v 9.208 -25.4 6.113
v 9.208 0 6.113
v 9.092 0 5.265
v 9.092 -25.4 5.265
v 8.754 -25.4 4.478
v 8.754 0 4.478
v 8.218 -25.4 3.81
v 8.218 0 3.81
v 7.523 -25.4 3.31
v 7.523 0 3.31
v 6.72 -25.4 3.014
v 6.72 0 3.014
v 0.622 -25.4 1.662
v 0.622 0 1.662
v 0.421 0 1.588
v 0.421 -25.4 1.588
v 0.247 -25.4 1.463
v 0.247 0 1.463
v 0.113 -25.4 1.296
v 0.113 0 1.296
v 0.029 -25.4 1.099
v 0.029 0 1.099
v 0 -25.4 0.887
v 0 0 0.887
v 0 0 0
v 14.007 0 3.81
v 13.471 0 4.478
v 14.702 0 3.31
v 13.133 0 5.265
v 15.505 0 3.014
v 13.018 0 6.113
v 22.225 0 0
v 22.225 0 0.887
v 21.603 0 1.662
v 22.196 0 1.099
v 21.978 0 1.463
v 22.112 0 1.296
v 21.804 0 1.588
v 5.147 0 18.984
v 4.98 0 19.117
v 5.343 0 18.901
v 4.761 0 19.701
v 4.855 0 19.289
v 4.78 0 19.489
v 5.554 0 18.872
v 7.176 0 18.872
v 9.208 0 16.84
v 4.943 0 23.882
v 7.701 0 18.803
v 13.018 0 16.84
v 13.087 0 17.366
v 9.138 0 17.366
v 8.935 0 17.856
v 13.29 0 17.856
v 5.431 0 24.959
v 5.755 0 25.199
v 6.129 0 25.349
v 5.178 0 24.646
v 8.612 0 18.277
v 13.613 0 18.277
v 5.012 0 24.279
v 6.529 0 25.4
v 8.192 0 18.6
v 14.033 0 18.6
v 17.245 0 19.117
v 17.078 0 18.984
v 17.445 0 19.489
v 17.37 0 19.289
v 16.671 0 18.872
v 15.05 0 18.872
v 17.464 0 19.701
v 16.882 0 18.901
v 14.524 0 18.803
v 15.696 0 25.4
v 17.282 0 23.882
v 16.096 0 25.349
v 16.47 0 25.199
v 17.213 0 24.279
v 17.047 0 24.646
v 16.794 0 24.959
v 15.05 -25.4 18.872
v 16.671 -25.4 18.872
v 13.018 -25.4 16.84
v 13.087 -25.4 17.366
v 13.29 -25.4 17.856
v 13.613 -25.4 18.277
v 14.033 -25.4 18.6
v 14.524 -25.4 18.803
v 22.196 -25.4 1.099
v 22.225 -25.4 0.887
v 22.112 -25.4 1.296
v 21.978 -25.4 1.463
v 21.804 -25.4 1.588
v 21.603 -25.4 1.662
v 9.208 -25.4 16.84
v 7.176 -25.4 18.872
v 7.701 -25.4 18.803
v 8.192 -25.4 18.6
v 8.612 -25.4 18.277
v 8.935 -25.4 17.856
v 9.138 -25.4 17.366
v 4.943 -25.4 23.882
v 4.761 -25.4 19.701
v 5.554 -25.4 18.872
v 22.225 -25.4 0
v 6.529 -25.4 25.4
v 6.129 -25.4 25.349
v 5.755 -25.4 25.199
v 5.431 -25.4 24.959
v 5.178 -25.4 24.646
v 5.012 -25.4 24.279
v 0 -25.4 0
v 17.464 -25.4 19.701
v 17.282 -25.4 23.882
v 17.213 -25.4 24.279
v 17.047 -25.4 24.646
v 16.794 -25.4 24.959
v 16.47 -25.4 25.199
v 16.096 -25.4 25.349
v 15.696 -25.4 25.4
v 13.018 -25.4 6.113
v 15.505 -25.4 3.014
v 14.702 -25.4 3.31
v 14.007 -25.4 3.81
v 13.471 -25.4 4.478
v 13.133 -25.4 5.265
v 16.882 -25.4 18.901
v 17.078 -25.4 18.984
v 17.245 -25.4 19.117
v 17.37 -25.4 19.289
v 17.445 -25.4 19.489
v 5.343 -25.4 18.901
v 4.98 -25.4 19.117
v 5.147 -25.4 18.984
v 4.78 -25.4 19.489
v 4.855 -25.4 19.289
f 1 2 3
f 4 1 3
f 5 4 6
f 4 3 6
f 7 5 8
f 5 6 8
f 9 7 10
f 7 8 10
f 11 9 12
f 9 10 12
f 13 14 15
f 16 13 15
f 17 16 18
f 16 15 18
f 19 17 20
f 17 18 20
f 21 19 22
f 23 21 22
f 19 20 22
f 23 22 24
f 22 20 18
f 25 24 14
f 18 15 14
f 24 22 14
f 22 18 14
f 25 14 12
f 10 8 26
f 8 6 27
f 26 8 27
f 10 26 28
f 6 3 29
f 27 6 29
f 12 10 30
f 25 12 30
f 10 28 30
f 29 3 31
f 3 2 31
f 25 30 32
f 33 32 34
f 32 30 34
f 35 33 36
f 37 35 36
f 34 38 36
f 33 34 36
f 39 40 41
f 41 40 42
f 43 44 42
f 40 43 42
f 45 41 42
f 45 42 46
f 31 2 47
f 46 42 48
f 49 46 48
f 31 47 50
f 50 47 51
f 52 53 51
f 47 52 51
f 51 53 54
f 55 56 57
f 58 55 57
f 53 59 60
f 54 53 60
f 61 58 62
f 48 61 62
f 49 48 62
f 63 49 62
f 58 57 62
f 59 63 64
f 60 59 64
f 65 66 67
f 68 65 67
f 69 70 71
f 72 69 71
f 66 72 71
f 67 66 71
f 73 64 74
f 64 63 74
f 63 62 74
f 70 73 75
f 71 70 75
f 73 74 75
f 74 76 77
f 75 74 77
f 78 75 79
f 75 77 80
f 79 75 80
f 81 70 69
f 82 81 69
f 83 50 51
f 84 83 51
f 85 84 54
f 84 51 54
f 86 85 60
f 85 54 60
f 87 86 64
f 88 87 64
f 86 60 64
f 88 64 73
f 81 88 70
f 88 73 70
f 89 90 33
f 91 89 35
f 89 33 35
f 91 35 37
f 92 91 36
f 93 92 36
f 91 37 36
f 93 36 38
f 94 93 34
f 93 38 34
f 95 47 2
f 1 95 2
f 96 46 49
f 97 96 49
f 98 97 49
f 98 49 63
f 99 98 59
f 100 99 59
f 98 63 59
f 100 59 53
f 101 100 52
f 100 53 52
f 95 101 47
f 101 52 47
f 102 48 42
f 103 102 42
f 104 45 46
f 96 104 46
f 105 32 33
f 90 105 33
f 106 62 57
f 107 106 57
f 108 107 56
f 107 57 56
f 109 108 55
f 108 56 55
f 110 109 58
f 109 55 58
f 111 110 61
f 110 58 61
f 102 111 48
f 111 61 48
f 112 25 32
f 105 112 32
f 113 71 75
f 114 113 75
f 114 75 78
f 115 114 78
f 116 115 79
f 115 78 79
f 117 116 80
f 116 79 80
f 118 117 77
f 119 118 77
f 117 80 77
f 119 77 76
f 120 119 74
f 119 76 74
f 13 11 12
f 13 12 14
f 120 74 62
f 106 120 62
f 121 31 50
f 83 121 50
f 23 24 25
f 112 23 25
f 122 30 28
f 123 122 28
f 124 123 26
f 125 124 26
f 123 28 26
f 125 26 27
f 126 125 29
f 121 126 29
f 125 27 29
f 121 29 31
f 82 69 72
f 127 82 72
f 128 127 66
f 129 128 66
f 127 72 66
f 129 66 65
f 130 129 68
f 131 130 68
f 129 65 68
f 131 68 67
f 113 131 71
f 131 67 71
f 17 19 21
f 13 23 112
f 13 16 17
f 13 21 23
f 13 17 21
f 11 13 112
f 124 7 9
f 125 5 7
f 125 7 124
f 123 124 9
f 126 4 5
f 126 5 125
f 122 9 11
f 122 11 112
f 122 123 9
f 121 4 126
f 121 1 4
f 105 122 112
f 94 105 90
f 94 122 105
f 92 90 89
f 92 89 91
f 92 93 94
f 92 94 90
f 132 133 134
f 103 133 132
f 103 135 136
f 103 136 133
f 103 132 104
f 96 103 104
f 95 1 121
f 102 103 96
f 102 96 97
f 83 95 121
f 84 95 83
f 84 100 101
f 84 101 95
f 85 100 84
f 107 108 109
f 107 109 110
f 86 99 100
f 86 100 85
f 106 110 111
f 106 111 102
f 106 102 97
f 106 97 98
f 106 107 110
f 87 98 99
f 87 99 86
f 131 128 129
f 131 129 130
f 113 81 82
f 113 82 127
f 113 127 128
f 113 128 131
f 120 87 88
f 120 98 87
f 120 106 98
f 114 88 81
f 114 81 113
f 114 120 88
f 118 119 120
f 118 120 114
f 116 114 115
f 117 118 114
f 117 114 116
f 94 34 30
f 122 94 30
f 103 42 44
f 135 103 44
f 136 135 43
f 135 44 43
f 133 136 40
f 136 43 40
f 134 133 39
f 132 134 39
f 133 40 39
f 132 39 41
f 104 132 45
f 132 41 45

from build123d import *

# Parameters (mm, degrees)
F1_DEPTH = 25.4


with BuildPart() as f1:
    # F0 (on Front) → F1 (new body)
    with BuildSketch(Plane.XZ):
        with BuildLine():
            Line((0, 0.886948), (0, 0))
            Line((0, 0), (22.225, 0))
            Line((22.225, 0), (22.225, 0.886948))
            ThreePointArc((22.225, 0.886948), (22.050283, 1.383775), (21.603049, 1.661883))
            Line((21.603049, 1.661883), (15.505304, 3.013721))
            ThreePointArc((15.505304, 3.013721), (13.716367, 4.126153), (13.0175, 6.113461))
            Line((13.0175, 6.113461), (13.0175, 16.8402))
            ThreePointArc((13.0175, 16.8402), (13.612659, 18.277041), (15.0495, 18.8722))
            Line((15.0495, 18.8722), (16.671438, 18.8722))
            ThreePointArc((16.671438, 18.8722), (17.244814, 19.117062), (17.464432, 19.700573))
            Line((17.464432, 19.700573), (17.281879, 23.881746))
            ThreePointArc((17.281879, 23.881746), (16.793666, 24.959253), (15.695889, 25.4))
            Line((15.695889, 25.4), (6.529111, 25.4))
            ThreePointArc((6.529111, 25.4), (5.431334, 24.959253), (4.943121, 23.881746))
            Line((4.943121, 23.881746), (4.760568, 19.700573))
            ThreePointArc((4.760568, 19.700573), (4.980186, 19.117062), (5.553562, 18.8722))
            Line((5.553562, 18.8722), (7.1755, 18.8722))
            ThreePointArc((7.1755, 18.8722), (8.612341, 18.277041), (9.2075, 16.8402))
            Line((9.2075, 16.8402), (9.2075, 6.113461))
            ThreePointArc((9.2075, 6.113461), (8.508633, 4.126153), (6.719696, 3.013721))
            Line((6.719696, 3.013721), (0.621951, 1.661883))
            ThreePointArc((0.621951, 1.661883), (0.174717, 1.383775), (0, 0.886948))
        make_face()
    extrude(amount=F1_DEPTH)


solid = f1.part
